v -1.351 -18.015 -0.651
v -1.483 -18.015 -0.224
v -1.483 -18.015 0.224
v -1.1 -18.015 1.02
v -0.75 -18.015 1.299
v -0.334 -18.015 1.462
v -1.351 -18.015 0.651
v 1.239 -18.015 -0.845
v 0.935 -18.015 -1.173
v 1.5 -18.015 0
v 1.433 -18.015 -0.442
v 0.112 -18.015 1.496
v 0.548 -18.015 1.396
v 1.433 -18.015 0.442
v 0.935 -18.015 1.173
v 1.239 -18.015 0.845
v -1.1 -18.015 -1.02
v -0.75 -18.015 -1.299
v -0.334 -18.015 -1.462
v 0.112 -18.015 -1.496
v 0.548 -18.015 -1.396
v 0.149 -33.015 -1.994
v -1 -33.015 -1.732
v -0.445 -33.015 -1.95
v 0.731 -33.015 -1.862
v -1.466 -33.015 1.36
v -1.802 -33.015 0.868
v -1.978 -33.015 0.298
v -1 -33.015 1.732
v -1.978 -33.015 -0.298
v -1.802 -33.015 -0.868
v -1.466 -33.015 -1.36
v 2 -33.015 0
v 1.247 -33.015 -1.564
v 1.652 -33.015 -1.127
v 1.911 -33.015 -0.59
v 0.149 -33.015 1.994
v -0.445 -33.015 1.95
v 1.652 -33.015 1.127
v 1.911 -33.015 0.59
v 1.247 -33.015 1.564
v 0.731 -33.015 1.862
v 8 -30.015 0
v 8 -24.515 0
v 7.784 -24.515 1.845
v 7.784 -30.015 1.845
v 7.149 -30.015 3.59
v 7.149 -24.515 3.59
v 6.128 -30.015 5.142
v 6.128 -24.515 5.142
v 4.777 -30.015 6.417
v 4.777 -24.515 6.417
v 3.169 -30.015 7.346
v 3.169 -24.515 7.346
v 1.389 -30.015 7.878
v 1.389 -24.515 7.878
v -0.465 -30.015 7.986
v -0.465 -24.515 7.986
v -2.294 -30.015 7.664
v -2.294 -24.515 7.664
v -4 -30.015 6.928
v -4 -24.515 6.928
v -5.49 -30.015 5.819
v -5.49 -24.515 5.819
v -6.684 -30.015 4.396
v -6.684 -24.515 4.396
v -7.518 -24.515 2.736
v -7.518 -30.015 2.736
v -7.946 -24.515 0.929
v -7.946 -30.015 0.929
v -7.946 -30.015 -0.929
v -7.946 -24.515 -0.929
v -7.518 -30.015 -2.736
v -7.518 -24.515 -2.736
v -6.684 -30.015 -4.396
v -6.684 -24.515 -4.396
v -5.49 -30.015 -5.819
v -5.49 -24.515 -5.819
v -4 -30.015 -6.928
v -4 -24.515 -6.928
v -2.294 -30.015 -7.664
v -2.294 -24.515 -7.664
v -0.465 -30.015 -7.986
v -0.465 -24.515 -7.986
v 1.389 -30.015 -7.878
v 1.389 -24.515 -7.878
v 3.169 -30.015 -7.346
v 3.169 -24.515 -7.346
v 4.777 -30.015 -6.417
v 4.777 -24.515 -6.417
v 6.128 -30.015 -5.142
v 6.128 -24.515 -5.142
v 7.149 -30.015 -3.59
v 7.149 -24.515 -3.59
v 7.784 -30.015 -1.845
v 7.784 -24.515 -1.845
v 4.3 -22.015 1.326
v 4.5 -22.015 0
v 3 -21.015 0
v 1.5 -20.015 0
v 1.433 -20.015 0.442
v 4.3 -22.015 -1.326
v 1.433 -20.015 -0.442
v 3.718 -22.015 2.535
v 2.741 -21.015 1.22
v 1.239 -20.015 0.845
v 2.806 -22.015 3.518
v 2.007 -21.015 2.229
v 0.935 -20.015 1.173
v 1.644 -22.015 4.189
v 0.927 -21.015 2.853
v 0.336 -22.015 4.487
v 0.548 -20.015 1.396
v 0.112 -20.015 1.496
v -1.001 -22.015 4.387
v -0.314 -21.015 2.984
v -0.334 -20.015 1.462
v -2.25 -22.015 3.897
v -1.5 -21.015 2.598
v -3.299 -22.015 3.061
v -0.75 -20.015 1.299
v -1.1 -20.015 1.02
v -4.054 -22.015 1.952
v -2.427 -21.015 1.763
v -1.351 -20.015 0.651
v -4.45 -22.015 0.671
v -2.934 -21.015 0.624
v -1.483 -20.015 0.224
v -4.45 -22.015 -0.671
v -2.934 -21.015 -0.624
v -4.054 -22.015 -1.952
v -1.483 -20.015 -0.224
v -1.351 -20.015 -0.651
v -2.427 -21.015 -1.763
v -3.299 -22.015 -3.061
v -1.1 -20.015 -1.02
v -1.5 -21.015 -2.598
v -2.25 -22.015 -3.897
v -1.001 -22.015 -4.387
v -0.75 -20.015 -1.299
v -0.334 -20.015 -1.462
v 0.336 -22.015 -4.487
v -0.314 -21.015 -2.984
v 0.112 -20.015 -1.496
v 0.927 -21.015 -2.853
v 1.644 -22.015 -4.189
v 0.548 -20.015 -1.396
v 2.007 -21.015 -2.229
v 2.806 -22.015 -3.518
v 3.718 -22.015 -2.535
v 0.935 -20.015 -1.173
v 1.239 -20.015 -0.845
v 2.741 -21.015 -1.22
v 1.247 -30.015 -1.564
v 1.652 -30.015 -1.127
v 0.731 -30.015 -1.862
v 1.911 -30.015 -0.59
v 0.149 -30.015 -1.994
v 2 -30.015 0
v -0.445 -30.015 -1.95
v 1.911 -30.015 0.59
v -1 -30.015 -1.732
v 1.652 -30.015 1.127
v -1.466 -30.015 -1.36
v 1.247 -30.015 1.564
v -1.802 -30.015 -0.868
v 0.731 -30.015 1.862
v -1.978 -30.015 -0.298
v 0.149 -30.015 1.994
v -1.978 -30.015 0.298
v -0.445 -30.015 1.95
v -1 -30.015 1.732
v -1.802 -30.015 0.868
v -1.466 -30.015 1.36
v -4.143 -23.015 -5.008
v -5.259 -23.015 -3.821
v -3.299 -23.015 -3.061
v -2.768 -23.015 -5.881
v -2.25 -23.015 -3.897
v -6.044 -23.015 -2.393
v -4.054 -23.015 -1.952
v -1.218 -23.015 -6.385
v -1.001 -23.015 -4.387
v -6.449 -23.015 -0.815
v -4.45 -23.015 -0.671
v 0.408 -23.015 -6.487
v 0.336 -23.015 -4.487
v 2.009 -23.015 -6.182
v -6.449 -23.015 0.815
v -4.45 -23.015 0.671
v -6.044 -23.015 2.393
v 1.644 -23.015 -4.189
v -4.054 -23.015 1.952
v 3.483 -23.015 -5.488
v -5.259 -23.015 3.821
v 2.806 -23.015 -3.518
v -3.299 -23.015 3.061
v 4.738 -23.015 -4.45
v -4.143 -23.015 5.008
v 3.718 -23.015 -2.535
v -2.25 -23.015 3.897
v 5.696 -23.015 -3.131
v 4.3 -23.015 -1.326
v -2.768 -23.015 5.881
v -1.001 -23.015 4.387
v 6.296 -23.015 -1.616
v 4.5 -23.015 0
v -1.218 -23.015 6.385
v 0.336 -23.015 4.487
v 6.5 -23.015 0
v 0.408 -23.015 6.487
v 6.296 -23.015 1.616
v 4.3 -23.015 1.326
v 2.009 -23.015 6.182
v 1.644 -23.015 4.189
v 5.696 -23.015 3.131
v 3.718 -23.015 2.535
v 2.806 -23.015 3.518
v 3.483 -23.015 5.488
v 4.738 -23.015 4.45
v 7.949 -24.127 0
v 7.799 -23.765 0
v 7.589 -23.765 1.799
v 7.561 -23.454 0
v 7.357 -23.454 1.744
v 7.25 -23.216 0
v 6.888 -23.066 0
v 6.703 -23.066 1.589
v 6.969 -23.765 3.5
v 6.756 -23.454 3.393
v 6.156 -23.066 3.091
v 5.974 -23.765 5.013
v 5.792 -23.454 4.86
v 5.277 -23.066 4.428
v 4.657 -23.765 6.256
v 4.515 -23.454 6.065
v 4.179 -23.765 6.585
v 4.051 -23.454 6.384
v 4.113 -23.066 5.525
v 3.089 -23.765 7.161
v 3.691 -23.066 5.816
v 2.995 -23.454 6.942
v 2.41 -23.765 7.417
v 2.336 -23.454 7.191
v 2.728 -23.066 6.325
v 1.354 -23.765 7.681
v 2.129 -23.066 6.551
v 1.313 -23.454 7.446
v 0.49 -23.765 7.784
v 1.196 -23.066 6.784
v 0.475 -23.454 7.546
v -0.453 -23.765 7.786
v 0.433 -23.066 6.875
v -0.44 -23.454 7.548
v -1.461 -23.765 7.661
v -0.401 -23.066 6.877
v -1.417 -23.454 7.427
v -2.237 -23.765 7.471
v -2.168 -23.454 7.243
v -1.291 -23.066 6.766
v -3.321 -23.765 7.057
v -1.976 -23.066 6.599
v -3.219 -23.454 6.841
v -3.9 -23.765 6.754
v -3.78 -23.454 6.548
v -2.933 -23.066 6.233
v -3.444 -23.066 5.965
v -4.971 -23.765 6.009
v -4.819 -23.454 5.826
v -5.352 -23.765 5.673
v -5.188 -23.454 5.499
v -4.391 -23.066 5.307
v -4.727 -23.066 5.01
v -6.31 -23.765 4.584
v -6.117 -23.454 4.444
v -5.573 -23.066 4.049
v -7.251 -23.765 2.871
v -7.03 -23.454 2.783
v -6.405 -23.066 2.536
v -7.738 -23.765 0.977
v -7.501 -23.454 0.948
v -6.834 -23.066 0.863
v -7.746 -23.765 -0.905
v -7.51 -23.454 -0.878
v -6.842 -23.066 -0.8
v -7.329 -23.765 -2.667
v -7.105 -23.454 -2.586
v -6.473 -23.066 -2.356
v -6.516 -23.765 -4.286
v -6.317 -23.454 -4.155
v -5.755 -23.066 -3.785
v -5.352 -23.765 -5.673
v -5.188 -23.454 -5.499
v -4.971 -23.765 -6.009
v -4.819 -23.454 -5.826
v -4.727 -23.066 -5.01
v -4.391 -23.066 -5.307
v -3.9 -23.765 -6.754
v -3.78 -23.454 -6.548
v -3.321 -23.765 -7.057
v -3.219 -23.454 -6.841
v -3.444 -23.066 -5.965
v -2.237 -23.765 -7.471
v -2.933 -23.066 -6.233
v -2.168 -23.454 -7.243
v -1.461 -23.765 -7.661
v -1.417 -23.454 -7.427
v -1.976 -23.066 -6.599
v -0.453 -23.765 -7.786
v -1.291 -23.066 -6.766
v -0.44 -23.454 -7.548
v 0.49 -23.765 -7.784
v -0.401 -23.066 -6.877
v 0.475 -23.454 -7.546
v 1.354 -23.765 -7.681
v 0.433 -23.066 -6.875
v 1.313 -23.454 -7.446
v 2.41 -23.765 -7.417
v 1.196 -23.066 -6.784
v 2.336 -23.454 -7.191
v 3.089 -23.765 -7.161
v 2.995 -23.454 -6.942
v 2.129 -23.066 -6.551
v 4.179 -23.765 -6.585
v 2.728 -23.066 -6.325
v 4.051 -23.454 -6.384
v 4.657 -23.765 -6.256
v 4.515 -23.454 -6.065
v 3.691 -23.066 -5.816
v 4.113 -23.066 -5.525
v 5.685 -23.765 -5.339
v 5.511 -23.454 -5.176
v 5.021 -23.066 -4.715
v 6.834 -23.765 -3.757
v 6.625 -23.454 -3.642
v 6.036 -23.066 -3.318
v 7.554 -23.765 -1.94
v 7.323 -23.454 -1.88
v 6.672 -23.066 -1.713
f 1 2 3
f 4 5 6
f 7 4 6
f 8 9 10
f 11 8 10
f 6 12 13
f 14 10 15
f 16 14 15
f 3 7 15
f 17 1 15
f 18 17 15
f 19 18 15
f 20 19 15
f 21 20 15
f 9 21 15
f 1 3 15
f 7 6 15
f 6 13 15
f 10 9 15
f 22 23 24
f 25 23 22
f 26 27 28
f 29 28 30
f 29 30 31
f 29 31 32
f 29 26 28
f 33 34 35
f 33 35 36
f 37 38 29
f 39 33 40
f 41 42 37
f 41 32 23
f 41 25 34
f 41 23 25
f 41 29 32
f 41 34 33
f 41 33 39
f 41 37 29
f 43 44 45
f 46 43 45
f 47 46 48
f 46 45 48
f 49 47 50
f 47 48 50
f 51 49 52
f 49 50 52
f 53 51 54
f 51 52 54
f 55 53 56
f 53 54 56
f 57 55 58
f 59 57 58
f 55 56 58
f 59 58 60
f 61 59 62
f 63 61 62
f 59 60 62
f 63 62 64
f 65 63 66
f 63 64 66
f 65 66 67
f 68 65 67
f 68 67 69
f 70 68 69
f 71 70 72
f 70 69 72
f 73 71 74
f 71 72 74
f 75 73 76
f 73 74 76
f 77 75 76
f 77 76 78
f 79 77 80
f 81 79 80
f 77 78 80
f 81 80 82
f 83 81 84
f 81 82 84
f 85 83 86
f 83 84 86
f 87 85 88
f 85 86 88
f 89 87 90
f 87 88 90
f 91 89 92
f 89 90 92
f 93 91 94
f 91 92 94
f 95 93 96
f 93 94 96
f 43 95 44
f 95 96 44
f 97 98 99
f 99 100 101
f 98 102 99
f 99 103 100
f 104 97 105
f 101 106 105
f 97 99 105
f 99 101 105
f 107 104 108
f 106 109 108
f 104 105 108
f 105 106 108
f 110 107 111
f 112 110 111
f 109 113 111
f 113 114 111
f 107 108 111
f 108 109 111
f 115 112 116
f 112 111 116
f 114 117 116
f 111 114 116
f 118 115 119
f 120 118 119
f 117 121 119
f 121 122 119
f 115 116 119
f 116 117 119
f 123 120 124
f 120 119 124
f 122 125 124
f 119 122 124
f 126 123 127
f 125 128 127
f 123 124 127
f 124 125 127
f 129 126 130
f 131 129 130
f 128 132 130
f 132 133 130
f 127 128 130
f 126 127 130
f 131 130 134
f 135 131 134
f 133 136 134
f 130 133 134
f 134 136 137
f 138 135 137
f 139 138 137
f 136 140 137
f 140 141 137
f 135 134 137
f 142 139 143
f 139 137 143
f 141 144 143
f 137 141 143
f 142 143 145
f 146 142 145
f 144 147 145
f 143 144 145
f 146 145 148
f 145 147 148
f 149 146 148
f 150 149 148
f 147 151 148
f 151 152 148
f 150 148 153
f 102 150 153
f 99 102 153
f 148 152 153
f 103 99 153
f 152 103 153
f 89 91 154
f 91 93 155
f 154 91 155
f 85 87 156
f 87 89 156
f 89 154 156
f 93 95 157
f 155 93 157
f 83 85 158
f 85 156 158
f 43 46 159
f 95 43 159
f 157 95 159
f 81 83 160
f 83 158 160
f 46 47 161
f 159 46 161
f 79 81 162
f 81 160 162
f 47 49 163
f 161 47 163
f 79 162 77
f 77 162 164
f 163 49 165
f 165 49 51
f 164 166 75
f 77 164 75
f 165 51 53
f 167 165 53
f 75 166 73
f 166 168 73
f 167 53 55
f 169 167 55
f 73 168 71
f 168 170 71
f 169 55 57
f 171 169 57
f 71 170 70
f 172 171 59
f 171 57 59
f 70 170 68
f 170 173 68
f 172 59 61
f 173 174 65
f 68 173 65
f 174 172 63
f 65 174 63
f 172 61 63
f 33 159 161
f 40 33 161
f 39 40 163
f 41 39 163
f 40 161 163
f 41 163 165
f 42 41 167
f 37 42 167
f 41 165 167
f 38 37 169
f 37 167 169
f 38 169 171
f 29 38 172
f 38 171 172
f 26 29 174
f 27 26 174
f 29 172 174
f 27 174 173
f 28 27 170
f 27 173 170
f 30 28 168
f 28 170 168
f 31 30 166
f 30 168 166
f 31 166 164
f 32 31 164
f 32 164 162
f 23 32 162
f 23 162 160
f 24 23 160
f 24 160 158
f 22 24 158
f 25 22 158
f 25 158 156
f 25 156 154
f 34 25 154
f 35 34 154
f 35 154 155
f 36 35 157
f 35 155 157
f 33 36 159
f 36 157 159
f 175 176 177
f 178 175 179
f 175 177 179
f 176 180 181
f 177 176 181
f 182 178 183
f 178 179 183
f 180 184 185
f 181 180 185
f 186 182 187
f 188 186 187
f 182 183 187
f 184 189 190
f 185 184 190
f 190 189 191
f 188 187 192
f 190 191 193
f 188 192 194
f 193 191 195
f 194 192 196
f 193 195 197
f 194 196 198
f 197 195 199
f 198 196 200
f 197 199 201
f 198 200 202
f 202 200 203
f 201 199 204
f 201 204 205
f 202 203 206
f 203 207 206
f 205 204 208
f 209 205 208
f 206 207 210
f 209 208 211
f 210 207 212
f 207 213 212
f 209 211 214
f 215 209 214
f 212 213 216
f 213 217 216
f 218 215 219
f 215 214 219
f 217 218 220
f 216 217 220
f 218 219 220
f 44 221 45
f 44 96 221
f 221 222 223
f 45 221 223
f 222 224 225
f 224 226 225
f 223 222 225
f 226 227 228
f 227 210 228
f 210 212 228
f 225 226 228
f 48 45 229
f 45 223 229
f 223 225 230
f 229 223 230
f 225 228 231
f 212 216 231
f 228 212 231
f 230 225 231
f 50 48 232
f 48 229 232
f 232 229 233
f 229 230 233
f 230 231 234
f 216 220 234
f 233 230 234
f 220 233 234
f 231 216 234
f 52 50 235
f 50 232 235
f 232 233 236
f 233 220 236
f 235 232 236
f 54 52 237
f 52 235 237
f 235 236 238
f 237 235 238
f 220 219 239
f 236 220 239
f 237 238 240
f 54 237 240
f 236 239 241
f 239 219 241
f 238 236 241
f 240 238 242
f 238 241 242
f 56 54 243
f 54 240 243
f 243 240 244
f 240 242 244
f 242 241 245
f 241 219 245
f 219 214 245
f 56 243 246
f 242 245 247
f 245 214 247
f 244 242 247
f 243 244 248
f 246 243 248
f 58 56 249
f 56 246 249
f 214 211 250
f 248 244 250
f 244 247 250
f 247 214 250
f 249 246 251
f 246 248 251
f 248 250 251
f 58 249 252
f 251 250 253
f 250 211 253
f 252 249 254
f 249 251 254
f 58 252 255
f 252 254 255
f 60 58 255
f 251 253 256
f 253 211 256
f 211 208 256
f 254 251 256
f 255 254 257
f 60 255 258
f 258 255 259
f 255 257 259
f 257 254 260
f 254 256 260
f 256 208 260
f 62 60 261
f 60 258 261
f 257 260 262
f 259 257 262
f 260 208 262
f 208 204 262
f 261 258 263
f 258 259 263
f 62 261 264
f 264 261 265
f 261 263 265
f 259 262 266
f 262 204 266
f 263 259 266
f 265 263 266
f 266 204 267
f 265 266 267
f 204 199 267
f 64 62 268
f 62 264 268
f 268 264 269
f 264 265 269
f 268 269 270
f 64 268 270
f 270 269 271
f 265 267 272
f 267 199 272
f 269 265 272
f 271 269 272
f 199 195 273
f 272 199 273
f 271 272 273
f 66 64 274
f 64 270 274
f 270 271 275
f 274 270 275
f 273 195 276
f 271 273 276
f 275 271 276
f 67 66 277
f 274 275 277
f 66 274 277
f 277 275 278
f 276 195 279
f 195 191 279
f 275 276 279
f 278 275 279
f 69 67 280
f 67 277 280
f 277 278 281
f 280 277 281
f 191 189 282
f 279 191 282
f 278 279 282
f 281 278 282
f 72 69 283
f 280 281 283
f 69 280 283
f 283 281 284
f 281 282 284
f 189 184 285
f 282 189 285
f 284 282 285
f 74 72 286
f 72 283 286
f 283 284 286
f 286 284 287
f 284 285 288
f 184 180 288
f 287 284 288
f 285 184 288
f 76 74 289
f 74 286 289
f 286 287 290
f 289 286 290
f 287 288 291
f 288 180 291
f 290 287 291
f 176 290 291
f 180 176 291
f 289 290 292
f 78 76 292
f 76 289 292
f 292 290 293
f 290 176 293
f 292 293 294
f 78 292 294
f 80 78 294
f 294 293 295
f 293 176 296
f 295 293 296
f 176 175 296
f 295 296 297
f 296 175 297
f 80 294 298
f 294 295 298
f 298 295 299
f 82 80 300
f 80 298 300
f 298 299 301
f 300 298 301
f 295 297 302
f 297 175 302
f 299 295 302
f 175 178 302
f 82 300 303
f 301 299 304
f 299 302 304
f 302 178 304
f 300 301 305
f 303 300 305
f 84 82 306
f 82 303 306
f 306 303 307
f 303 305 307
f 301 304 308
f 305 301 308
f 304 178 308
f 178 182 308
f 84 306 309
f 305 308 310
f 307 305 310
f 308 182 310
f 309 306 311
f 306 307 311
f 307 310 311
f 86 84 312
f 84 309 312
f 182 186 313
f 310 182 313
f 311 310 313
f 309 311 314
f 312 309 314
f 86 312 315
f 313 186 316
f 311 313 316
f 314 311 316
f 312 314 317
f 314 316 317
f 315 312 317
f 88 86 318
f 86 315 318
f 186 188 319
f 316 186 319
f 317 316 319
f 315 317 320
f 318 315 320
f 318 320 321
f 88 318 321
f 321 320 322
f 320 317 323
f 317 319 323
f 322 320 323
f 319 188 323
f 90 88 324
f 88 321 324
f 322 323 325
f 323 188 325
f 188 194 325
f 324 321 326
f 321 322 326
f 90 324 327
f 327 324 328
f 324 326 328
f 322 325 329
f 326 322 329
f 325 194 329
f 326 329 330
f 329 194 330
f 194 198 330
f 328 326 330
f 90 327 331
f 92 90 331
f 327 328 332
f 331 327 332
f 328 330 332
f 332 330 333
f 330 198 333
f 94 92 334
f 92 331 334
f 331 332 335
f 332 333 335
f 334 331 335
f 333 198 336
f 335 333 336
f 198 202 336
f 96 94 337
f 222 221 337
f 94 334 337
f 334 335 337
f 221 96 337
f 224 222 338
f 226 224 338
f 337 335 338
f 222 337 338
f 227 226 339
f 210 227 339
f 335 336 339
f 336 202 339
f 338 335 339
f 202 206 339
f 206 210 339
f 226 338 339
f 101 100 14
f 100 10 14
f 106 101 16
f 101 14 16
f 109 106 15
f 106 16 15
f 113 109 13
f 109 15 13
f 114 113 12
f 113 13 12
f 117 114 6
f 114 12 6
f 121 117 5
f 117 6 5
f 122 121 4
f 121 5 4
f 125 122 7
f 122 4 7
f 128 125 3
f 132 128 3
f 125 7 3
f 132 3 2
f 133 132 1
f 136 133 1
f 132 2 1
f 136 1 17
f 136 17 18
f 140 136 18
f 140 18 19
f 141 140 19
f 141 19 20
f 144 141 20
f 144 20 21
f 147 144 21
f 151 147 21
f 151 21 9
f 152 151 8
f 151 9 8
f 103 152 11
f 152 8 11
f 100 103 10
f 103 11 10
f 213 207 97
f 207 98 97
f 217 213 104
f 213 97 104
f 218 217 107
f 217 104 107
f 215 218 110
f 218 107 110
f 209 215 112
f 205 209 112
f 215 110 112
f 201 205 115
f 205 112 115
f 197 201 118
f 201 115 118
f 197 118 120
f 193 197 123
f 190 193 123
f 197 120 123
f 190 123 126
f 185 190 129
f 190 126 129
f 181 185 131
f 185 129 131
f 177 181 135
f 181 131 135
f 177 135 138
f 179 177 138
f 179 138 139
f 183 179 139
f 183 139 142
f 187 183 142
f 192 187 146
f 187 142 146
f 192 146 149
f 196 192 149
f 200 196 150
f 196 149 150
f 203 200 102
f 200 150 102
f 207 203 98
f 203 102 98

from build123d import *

# Parameters (mm, degrees)
FILLET2_R           = 1.5
SKETCH3_R           = 2
BOSS_EXTRUDE1_DEPTH = 3


with BuildPart() as part:
    # Sketch2 → Revolve1 (revolve)
    with BuildSketch(Plane.XY):
        Polygon((0, -30.015007431), (8, -30.015007431), (8, -23.015007431), (4.5, -23.015007431), (4.5, -22.015007431), (1.5, -20.015007431), (1.5, -18.015007431), (0, -18.015007431), align=None)
    revolve(axis=Axis((0, 46.076216781, 0), (0, -1, 0)))

    # Fillet2
    fillet2_edges = [part.edges().sort_by_distance(p)[0] for p in [
        (-8, -23.015007431, 0),
    ]]
    fillet(fillet2_edges, radius=FILLET2_R)

    # Sketch3 → Boss-Extrude1 (add)
    with BuildSketch(Plane.XZ.offset(30.015007431)):
        Circle(SKETCH3_R)
    extrude(amount=BOSS_EXTRUDE1_DEPTH)


solid = part.part
